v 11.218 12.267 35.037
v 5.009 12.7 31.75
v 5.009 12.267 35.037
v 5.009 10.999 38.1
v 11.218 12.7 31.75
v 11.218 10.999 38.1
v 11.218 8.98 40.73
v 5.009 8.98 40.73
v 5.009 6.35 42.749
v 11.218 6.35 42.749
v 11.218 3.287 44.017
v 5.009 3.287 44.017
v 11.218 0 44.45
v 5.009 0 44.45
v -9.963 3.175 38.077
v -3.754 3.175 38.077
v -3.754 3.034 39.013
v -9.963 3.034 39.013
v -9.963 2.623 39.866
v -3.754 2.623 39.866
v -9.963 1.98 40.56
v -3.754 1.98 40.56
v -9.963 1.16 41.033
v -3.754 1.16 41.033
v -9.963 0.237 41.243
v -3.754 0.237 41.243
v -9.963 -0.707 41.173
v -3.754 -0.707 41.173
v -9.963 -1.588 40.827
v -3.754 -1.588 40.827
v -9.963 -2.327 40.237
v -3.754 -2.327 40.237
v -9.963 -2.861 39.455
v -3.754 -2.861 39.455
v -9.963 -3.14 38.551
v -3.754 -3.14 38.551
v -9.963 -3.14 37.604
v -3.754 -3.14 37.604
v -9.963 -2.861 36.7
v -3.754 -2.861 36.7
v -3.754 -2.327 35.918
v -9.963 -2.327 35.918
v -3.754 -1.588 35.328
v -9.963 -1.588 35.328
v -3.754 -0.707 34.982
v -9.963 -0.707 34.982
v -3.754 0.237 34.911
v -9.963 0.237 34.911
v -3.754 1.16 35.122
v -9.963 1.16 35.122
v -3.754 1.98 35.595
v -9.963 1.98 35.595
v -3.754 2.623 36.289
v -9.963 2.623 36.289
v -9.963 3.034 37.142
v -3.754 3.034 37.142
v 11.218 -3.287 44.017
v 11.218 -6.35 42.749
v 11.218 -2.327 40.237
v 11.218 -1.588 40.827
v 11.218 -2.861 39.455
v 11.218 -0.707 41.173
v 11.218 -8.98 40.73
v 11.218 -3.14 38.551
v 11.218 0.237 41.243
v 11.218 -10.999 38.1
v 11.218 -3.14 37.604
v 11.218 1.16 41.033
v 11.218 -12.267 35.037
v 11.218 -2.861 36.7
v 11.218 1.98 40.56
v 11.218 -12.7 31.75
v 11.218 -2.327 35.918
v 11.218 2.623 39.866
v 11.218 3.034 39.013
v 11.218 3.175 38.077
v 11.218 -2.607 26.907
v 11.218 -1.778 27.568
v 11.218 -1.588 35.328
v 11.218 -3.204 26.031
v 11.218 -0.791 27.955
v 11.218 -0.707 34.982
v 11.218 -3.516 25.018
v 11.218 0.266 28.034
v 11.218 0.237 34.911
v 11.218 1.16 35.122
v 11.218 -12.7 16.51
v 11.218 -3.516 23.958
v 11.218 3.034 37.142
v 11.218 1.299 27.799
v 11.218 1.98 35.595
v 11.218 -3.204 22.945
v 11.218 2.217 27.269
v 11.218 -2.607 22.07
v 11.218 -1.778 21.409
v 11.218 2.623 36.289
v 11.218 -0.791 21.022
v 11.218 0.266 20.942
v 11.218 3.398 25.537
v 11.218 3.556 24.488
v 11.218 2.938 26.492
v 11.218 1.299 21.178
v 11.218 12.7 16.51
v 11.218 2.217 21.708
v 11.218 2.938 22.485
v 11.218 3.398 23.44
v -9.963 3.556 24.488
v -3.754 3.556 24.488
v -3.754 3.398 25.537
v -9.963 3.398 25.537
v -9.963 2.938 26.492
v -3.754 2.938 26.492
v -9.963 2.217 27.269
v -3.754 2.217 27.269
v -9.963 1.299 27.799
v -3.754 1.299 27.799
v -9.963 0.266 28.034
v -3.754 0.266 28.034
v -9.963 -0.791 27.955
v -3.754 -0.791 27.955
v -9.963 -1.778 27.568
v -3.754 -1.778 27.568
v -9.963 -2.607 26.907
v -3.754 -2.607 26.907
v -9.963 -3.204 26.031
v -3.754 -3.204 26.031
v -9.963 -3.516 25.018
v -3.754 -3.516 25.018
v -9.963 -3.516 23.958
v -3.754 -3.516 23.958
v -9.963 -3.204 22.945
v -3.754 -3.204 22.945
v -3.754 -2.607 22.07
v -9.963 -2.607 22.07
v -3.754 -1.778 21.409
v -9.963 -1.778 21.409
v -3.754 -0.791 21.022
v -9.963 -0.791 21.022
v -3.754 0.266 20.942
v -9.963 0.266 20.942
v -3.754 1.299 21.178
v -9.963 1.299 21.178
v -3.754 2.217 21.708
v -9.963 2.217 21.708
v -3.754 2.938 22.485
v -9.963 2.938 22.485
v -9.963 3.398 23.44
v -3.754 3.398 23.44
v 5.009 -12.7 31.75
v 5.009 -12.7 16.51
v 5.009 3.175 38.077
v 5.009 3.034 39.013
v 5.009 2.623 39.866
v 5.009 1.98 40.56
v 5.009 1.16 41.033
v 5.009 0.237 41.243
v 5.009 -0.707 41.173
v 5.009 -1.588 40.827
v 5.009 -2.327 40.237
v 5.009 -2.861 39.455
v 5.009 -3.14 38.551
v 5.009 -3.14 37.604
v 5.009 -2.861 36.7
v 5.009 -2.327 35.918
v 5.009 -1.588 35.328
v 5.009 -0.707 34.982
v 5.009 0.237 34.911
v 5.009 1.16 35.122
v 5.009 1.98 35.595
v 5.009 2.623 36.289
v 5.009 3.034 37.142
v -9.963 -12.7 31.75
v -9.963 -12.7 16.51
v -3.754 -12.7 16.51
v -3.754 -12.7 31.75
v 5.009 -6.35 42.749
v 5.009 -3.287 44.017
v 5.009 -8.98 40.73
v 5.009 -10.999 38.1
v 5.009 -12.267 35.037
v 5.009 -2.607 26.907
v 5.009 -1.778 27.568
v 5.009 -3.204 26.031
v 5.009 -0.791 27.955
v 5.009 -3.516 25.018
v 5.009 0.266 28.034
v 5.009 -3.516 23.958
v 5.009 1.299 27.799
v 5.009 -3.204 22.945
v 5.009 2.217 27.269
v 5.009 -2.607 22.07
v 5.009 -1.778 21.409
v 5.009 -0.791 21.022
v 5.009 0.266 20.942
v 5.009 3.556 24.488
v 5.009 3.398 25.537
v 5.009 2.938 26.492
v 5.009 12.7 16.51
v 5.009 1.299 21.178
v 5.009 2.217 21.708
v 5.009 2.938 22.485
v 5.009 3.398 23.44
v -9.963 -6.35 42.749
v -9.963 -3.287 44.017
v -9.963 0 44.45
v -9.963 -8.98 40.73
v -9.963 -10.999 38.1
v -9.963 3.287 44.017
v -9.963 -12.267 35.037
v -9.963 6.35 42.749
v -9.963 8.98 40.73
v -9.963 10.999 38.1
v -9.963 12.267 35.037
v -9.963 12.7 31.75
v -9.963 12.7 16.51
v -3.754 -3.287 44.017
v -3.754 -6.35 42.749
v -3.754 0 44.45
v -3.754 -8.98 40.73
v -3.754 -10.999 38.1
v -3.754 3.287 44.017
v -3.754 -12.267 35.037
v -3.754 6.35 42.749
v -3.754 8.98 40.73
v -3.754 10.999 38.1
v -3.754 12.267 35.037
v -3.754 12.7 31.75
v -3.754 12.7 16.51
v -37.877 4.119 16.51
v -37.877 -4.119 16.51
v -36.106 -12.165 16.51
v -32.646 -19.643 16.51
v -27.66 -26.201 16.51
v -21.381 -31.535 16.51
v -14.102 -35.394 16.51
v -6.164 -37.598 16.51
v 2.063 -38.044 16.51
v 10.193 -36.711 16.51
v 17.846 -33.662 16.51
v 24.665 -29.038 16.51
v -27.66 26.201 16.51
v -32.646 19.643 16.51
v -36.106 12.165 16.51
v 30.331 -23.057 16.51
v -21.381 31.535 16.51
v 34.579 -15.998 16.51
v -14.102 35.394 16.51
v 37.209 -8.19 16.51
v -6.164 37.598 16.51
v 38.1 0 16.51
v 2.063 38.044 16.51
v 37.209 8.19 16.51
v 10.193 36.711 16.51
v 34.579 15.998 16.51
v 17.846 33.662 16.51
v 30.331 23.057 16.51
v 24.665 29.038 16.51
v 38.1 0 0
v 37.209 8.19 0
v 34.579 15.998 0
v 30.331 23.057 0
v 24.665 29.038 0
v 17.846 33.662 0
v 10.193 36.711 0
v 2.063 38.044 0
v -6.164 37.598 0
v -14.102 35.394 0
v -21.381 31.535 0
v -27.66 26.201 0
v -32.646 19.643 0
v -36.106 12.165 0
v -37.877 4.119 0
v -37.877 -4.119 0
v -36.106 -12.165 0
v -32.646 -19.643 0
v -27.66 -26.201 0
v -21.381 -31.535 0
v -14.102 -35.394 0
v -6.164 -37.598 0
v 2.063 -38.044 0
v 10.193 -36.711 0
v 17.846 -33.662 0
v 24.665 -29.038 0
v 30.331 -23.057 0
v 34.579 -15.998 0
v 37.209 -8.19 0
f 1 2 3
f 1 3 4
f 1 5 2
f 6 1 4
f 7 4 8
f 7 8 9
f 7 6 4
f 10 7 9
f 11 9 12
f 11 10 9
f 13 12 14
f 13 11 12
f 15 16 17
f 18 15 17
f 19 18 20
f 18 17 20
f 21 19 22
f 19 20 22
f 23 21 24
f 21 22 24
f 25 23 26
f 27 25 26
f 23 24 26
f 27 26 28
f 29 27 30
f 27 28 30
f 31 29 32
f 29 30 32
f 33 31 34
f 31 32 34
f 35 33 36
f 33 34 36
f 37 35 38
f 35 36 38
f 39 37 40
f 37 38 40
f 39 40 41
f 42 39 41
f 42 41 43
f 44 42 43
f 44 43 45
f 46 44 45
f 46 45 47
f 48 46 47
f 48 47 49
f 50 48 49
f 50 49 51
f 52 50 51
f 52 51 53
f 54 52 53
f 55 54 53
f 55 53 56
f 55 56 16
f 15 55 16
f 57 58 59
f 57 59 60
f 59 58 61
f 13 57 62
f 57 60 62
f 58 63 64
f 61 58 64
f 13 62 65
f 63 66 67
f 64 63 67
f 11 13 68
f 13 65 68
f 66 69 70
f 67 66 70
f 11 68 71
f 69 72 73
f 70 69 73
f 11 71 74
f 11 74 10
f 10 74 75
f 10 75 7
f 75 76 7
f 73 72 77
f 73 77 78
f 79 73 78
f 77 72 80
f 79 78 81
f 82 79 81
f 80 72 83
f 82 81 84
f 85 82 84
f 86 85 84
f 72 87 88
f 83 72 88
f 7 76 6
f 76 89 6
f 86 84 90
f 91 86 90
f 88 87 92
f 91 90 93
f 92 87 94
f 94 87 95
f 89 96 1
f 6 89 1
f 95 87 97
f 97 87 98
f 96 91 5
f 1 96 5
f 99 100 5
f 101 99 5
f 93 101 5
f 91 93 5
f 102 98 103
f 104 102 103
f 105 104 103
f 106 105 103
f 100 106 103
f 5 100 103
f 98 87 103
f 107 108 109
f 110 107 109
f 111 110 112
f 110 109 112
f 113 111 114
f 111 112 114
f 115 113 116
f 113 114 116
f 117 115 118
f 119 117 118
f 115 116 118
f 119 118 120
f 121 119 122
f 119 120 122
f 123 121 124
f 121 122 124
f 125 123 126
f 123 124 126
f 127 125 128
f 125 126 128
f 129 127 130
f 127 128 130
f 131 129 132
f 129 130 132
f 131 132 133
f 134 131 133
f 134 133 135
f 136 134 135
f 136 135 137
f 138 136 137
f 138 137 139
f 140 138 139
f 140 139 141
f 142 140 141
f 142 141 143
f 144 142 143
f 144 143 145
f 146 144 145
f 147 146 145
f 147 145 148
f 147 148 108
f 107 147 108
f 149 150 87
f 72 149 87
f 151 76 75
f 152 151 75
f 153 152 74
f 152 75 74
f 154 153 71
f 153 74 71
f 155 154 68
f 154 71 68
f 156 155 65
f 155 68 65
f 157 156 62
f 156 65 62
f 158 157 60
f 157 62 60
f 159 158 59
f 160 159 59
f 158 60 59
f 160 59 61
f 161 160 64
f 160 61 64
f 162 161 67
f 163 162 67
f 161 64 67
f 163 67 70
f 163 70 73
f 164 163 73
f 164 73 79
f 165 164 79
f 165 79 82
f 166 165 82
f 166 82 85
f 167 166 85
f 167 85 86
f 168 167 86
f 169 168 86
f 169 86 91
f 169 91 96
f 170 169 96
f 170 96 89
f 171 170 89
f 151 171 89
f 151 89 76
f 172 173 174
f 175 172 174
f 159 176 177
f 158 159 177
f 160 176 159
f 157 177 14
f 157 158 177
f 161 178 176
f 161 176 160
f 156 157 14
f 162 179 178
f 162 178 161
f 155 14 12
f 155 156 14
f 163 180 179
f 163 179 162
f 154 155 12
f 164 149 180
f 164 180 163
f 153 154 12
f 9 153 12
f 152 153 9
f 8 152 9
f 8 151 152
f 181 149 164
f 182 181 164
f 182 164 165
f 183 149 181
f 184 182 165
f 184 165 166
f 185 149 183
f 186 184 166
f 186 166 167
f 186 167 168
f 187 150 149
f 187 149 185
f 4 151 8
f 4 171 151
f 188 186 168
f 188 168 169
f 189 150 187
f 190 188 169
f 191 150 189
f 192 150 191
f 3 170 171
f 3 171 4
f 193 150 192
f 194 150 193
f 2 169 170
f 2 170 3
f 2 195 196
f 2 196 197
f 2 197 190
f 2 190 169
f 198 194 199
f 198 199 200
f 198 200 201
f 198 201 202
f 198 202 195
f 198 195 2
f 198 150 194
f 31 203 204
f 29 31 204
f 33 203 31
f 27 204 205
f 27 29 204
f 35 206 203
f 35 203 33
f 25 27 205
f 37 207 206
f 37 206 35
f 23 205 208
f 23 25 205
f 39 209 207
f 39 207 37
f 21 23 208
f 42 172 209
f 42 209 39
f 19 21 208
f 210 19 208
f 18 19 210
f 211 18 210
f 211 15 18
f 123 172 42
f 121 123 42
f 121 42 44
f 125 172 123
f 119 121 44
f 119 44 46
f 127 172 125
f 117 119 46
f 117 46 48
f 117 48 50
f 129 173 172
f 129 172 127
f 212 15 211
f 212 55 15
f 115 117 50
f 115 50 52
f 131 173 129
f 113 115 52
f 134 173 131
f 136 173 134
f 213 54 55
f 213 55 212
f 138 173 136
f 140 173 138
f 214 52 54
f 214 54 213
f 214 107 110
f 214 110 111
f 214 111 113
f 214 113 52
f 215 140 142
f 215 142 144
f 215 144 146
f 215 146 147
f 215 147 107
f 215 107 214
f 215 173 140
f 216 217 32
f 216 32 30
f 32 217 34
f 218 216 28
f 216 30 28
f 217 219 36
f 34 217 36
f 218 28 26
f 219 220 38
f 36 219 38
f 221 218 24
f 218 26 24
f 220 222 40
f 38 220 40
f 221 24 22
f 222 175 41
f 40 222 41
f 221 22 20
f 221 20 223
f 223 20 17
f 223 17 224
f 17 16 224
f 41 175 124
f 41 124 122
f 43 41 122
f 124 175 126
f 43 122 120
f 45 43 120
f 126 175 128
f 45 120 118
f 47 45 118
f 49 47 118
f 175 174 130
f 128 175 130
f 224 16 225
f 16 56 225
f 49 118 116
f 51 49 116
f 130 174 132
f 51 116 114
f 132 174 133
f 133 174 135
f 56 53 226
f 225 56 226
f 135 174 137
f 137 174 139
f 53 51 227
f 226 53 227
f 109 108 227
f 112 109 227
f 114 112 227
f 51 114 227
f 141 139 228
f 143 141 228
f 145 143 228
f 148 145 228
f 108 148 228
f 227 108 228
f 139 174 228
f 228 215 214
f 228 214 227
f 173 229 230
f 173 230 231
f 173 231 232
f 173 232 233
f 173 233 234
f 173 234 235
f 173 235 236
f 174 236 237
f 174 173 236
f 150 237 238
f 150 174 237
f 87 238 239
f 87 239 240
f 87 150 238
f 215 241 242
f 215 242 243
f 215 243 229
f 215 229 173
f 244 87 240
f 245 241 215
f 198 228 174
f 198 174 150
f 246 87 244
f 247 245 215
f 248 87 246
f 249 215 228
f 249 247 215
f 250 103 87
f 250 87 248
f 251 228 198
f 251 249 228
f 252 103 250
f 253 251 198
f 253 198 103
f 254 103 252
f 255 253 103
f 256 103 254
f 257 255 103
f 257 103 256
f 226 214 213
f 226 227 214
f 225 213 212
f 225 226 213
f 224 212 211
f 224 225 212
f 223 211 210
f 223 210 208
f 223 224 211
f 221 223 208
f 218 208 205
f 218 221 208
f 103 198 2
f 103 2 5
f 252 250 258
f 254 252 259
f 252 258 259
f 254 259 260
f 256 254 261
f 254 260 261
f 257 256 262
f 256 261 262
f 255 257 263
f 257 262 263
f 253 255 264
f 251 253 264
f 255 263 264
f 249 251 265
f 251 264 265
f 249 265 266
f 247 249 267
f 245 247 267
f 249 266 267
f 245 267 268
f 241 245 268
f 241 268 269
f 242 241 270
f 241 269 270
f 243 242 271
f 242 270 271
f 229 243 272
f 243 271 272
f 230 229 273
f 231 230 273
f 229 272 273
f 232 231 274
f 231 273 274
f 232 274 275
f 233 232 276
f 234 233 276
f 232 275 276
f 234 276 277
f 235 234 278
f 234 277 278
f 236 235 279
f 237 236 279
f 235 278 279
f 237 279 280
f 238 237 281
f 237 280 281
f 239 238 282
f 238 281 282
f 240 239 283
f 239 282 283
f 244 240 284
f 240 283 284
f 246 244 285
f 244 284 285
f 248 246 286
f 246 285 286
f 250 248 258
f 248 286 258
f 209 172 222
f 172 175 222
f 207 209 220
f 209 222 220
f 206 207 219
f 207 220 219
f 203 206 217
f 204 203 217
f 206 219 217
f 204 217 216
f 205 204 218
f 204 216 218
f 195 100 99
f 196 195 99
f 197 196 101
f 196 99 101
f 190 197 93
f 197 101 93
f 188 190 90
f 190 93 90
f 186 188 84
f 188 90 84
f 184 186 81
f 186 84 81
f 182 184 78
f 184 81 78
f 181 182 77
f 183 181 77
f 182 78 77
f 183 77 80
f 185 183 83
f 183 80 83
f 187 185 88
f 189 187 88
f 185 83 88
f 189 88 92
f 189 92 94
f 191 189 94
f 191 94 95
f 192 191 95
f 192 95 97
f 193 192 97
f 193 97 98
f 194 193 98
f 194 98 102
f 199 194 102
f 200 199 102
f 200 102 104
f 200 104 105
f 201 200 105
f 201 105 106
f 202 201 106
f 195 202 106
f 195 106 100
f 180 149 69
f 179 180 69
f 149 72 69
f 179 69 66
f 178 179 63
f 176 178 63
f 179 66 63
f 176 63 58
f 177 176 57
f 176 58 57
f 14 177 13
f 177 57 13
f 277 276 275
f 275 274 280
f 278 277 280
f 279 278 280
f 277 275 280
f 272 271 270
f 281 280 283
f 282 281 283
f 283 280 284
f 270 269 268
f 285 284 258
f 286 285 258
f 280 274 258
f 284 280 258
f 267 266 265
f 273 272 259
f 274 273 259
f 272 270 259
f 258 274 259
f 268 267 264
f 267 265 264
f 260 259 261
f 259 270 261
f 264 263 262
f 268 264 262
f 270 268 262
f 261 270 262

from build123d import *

# Parameters (mm, degrees)
F0_R     = 38.1
F1_DEPTH = 16.51
F2_W     = 6.20888776
F2_H     = 25.4
F2_W_2   = 6.2088776
F3_DEPTH = 27.94
F4_R     = 12.69999
F5_R     = 3.556
F5_R_2   = 3.175
F6_DEPTH = 49.319129452


# Not quite as in the source:
# - a fillet or chamfer is up to 0.001 mm smaller than in the source, because OpenCascade refuses the exact size


with BuildPart() as f1:
    # F0 (on Top) → F1 (new body)
    with BuildSketch(Plane.XY):
        Circle(F0_R)
    extrude(amount=F1_DEPTH)

    # F2 (on face) → F3 (join)
    with BuildSketch(Plane.XY.offset(16.51)):
        with Locations((-6.858192028, 0)):
            Rectangle(F2_W, F2_H)
        with Locations((8.113690652, 0)):
            Rectangle(F2_W_2, F2_H)
    extrude(amount=F3_DEPTH)

    # F4 (radius 12.7 in the source; OpenCascade refuses exactly that, so slightly less here)
    f4_edges = [f1.edges().sort_by_distance(p)[0] for p in [
        (-6.858192, 12.7, 44.45),
        (-6.858192, -12.7, 44.45),
        (8.113691, -12.7, 44.45),
        (8.113691, 12.7, 44.45),
    ]]
    fillet(f4_edges, radius=F4_R)

    # F5 (on face) → F6 (cut, through all)
    with BuildSketch(Plane.YZ.offset(11.218129452)):
        with Locations((0, 24.4883745909)):
            Circle(F5_R)
        with Locations((0, 38.0773745909)):
            Circle(F5_R_2)
    extrude(amount=-F6_DEPTH, mode=Mode.SUBTRACT)


solid = f1.part
